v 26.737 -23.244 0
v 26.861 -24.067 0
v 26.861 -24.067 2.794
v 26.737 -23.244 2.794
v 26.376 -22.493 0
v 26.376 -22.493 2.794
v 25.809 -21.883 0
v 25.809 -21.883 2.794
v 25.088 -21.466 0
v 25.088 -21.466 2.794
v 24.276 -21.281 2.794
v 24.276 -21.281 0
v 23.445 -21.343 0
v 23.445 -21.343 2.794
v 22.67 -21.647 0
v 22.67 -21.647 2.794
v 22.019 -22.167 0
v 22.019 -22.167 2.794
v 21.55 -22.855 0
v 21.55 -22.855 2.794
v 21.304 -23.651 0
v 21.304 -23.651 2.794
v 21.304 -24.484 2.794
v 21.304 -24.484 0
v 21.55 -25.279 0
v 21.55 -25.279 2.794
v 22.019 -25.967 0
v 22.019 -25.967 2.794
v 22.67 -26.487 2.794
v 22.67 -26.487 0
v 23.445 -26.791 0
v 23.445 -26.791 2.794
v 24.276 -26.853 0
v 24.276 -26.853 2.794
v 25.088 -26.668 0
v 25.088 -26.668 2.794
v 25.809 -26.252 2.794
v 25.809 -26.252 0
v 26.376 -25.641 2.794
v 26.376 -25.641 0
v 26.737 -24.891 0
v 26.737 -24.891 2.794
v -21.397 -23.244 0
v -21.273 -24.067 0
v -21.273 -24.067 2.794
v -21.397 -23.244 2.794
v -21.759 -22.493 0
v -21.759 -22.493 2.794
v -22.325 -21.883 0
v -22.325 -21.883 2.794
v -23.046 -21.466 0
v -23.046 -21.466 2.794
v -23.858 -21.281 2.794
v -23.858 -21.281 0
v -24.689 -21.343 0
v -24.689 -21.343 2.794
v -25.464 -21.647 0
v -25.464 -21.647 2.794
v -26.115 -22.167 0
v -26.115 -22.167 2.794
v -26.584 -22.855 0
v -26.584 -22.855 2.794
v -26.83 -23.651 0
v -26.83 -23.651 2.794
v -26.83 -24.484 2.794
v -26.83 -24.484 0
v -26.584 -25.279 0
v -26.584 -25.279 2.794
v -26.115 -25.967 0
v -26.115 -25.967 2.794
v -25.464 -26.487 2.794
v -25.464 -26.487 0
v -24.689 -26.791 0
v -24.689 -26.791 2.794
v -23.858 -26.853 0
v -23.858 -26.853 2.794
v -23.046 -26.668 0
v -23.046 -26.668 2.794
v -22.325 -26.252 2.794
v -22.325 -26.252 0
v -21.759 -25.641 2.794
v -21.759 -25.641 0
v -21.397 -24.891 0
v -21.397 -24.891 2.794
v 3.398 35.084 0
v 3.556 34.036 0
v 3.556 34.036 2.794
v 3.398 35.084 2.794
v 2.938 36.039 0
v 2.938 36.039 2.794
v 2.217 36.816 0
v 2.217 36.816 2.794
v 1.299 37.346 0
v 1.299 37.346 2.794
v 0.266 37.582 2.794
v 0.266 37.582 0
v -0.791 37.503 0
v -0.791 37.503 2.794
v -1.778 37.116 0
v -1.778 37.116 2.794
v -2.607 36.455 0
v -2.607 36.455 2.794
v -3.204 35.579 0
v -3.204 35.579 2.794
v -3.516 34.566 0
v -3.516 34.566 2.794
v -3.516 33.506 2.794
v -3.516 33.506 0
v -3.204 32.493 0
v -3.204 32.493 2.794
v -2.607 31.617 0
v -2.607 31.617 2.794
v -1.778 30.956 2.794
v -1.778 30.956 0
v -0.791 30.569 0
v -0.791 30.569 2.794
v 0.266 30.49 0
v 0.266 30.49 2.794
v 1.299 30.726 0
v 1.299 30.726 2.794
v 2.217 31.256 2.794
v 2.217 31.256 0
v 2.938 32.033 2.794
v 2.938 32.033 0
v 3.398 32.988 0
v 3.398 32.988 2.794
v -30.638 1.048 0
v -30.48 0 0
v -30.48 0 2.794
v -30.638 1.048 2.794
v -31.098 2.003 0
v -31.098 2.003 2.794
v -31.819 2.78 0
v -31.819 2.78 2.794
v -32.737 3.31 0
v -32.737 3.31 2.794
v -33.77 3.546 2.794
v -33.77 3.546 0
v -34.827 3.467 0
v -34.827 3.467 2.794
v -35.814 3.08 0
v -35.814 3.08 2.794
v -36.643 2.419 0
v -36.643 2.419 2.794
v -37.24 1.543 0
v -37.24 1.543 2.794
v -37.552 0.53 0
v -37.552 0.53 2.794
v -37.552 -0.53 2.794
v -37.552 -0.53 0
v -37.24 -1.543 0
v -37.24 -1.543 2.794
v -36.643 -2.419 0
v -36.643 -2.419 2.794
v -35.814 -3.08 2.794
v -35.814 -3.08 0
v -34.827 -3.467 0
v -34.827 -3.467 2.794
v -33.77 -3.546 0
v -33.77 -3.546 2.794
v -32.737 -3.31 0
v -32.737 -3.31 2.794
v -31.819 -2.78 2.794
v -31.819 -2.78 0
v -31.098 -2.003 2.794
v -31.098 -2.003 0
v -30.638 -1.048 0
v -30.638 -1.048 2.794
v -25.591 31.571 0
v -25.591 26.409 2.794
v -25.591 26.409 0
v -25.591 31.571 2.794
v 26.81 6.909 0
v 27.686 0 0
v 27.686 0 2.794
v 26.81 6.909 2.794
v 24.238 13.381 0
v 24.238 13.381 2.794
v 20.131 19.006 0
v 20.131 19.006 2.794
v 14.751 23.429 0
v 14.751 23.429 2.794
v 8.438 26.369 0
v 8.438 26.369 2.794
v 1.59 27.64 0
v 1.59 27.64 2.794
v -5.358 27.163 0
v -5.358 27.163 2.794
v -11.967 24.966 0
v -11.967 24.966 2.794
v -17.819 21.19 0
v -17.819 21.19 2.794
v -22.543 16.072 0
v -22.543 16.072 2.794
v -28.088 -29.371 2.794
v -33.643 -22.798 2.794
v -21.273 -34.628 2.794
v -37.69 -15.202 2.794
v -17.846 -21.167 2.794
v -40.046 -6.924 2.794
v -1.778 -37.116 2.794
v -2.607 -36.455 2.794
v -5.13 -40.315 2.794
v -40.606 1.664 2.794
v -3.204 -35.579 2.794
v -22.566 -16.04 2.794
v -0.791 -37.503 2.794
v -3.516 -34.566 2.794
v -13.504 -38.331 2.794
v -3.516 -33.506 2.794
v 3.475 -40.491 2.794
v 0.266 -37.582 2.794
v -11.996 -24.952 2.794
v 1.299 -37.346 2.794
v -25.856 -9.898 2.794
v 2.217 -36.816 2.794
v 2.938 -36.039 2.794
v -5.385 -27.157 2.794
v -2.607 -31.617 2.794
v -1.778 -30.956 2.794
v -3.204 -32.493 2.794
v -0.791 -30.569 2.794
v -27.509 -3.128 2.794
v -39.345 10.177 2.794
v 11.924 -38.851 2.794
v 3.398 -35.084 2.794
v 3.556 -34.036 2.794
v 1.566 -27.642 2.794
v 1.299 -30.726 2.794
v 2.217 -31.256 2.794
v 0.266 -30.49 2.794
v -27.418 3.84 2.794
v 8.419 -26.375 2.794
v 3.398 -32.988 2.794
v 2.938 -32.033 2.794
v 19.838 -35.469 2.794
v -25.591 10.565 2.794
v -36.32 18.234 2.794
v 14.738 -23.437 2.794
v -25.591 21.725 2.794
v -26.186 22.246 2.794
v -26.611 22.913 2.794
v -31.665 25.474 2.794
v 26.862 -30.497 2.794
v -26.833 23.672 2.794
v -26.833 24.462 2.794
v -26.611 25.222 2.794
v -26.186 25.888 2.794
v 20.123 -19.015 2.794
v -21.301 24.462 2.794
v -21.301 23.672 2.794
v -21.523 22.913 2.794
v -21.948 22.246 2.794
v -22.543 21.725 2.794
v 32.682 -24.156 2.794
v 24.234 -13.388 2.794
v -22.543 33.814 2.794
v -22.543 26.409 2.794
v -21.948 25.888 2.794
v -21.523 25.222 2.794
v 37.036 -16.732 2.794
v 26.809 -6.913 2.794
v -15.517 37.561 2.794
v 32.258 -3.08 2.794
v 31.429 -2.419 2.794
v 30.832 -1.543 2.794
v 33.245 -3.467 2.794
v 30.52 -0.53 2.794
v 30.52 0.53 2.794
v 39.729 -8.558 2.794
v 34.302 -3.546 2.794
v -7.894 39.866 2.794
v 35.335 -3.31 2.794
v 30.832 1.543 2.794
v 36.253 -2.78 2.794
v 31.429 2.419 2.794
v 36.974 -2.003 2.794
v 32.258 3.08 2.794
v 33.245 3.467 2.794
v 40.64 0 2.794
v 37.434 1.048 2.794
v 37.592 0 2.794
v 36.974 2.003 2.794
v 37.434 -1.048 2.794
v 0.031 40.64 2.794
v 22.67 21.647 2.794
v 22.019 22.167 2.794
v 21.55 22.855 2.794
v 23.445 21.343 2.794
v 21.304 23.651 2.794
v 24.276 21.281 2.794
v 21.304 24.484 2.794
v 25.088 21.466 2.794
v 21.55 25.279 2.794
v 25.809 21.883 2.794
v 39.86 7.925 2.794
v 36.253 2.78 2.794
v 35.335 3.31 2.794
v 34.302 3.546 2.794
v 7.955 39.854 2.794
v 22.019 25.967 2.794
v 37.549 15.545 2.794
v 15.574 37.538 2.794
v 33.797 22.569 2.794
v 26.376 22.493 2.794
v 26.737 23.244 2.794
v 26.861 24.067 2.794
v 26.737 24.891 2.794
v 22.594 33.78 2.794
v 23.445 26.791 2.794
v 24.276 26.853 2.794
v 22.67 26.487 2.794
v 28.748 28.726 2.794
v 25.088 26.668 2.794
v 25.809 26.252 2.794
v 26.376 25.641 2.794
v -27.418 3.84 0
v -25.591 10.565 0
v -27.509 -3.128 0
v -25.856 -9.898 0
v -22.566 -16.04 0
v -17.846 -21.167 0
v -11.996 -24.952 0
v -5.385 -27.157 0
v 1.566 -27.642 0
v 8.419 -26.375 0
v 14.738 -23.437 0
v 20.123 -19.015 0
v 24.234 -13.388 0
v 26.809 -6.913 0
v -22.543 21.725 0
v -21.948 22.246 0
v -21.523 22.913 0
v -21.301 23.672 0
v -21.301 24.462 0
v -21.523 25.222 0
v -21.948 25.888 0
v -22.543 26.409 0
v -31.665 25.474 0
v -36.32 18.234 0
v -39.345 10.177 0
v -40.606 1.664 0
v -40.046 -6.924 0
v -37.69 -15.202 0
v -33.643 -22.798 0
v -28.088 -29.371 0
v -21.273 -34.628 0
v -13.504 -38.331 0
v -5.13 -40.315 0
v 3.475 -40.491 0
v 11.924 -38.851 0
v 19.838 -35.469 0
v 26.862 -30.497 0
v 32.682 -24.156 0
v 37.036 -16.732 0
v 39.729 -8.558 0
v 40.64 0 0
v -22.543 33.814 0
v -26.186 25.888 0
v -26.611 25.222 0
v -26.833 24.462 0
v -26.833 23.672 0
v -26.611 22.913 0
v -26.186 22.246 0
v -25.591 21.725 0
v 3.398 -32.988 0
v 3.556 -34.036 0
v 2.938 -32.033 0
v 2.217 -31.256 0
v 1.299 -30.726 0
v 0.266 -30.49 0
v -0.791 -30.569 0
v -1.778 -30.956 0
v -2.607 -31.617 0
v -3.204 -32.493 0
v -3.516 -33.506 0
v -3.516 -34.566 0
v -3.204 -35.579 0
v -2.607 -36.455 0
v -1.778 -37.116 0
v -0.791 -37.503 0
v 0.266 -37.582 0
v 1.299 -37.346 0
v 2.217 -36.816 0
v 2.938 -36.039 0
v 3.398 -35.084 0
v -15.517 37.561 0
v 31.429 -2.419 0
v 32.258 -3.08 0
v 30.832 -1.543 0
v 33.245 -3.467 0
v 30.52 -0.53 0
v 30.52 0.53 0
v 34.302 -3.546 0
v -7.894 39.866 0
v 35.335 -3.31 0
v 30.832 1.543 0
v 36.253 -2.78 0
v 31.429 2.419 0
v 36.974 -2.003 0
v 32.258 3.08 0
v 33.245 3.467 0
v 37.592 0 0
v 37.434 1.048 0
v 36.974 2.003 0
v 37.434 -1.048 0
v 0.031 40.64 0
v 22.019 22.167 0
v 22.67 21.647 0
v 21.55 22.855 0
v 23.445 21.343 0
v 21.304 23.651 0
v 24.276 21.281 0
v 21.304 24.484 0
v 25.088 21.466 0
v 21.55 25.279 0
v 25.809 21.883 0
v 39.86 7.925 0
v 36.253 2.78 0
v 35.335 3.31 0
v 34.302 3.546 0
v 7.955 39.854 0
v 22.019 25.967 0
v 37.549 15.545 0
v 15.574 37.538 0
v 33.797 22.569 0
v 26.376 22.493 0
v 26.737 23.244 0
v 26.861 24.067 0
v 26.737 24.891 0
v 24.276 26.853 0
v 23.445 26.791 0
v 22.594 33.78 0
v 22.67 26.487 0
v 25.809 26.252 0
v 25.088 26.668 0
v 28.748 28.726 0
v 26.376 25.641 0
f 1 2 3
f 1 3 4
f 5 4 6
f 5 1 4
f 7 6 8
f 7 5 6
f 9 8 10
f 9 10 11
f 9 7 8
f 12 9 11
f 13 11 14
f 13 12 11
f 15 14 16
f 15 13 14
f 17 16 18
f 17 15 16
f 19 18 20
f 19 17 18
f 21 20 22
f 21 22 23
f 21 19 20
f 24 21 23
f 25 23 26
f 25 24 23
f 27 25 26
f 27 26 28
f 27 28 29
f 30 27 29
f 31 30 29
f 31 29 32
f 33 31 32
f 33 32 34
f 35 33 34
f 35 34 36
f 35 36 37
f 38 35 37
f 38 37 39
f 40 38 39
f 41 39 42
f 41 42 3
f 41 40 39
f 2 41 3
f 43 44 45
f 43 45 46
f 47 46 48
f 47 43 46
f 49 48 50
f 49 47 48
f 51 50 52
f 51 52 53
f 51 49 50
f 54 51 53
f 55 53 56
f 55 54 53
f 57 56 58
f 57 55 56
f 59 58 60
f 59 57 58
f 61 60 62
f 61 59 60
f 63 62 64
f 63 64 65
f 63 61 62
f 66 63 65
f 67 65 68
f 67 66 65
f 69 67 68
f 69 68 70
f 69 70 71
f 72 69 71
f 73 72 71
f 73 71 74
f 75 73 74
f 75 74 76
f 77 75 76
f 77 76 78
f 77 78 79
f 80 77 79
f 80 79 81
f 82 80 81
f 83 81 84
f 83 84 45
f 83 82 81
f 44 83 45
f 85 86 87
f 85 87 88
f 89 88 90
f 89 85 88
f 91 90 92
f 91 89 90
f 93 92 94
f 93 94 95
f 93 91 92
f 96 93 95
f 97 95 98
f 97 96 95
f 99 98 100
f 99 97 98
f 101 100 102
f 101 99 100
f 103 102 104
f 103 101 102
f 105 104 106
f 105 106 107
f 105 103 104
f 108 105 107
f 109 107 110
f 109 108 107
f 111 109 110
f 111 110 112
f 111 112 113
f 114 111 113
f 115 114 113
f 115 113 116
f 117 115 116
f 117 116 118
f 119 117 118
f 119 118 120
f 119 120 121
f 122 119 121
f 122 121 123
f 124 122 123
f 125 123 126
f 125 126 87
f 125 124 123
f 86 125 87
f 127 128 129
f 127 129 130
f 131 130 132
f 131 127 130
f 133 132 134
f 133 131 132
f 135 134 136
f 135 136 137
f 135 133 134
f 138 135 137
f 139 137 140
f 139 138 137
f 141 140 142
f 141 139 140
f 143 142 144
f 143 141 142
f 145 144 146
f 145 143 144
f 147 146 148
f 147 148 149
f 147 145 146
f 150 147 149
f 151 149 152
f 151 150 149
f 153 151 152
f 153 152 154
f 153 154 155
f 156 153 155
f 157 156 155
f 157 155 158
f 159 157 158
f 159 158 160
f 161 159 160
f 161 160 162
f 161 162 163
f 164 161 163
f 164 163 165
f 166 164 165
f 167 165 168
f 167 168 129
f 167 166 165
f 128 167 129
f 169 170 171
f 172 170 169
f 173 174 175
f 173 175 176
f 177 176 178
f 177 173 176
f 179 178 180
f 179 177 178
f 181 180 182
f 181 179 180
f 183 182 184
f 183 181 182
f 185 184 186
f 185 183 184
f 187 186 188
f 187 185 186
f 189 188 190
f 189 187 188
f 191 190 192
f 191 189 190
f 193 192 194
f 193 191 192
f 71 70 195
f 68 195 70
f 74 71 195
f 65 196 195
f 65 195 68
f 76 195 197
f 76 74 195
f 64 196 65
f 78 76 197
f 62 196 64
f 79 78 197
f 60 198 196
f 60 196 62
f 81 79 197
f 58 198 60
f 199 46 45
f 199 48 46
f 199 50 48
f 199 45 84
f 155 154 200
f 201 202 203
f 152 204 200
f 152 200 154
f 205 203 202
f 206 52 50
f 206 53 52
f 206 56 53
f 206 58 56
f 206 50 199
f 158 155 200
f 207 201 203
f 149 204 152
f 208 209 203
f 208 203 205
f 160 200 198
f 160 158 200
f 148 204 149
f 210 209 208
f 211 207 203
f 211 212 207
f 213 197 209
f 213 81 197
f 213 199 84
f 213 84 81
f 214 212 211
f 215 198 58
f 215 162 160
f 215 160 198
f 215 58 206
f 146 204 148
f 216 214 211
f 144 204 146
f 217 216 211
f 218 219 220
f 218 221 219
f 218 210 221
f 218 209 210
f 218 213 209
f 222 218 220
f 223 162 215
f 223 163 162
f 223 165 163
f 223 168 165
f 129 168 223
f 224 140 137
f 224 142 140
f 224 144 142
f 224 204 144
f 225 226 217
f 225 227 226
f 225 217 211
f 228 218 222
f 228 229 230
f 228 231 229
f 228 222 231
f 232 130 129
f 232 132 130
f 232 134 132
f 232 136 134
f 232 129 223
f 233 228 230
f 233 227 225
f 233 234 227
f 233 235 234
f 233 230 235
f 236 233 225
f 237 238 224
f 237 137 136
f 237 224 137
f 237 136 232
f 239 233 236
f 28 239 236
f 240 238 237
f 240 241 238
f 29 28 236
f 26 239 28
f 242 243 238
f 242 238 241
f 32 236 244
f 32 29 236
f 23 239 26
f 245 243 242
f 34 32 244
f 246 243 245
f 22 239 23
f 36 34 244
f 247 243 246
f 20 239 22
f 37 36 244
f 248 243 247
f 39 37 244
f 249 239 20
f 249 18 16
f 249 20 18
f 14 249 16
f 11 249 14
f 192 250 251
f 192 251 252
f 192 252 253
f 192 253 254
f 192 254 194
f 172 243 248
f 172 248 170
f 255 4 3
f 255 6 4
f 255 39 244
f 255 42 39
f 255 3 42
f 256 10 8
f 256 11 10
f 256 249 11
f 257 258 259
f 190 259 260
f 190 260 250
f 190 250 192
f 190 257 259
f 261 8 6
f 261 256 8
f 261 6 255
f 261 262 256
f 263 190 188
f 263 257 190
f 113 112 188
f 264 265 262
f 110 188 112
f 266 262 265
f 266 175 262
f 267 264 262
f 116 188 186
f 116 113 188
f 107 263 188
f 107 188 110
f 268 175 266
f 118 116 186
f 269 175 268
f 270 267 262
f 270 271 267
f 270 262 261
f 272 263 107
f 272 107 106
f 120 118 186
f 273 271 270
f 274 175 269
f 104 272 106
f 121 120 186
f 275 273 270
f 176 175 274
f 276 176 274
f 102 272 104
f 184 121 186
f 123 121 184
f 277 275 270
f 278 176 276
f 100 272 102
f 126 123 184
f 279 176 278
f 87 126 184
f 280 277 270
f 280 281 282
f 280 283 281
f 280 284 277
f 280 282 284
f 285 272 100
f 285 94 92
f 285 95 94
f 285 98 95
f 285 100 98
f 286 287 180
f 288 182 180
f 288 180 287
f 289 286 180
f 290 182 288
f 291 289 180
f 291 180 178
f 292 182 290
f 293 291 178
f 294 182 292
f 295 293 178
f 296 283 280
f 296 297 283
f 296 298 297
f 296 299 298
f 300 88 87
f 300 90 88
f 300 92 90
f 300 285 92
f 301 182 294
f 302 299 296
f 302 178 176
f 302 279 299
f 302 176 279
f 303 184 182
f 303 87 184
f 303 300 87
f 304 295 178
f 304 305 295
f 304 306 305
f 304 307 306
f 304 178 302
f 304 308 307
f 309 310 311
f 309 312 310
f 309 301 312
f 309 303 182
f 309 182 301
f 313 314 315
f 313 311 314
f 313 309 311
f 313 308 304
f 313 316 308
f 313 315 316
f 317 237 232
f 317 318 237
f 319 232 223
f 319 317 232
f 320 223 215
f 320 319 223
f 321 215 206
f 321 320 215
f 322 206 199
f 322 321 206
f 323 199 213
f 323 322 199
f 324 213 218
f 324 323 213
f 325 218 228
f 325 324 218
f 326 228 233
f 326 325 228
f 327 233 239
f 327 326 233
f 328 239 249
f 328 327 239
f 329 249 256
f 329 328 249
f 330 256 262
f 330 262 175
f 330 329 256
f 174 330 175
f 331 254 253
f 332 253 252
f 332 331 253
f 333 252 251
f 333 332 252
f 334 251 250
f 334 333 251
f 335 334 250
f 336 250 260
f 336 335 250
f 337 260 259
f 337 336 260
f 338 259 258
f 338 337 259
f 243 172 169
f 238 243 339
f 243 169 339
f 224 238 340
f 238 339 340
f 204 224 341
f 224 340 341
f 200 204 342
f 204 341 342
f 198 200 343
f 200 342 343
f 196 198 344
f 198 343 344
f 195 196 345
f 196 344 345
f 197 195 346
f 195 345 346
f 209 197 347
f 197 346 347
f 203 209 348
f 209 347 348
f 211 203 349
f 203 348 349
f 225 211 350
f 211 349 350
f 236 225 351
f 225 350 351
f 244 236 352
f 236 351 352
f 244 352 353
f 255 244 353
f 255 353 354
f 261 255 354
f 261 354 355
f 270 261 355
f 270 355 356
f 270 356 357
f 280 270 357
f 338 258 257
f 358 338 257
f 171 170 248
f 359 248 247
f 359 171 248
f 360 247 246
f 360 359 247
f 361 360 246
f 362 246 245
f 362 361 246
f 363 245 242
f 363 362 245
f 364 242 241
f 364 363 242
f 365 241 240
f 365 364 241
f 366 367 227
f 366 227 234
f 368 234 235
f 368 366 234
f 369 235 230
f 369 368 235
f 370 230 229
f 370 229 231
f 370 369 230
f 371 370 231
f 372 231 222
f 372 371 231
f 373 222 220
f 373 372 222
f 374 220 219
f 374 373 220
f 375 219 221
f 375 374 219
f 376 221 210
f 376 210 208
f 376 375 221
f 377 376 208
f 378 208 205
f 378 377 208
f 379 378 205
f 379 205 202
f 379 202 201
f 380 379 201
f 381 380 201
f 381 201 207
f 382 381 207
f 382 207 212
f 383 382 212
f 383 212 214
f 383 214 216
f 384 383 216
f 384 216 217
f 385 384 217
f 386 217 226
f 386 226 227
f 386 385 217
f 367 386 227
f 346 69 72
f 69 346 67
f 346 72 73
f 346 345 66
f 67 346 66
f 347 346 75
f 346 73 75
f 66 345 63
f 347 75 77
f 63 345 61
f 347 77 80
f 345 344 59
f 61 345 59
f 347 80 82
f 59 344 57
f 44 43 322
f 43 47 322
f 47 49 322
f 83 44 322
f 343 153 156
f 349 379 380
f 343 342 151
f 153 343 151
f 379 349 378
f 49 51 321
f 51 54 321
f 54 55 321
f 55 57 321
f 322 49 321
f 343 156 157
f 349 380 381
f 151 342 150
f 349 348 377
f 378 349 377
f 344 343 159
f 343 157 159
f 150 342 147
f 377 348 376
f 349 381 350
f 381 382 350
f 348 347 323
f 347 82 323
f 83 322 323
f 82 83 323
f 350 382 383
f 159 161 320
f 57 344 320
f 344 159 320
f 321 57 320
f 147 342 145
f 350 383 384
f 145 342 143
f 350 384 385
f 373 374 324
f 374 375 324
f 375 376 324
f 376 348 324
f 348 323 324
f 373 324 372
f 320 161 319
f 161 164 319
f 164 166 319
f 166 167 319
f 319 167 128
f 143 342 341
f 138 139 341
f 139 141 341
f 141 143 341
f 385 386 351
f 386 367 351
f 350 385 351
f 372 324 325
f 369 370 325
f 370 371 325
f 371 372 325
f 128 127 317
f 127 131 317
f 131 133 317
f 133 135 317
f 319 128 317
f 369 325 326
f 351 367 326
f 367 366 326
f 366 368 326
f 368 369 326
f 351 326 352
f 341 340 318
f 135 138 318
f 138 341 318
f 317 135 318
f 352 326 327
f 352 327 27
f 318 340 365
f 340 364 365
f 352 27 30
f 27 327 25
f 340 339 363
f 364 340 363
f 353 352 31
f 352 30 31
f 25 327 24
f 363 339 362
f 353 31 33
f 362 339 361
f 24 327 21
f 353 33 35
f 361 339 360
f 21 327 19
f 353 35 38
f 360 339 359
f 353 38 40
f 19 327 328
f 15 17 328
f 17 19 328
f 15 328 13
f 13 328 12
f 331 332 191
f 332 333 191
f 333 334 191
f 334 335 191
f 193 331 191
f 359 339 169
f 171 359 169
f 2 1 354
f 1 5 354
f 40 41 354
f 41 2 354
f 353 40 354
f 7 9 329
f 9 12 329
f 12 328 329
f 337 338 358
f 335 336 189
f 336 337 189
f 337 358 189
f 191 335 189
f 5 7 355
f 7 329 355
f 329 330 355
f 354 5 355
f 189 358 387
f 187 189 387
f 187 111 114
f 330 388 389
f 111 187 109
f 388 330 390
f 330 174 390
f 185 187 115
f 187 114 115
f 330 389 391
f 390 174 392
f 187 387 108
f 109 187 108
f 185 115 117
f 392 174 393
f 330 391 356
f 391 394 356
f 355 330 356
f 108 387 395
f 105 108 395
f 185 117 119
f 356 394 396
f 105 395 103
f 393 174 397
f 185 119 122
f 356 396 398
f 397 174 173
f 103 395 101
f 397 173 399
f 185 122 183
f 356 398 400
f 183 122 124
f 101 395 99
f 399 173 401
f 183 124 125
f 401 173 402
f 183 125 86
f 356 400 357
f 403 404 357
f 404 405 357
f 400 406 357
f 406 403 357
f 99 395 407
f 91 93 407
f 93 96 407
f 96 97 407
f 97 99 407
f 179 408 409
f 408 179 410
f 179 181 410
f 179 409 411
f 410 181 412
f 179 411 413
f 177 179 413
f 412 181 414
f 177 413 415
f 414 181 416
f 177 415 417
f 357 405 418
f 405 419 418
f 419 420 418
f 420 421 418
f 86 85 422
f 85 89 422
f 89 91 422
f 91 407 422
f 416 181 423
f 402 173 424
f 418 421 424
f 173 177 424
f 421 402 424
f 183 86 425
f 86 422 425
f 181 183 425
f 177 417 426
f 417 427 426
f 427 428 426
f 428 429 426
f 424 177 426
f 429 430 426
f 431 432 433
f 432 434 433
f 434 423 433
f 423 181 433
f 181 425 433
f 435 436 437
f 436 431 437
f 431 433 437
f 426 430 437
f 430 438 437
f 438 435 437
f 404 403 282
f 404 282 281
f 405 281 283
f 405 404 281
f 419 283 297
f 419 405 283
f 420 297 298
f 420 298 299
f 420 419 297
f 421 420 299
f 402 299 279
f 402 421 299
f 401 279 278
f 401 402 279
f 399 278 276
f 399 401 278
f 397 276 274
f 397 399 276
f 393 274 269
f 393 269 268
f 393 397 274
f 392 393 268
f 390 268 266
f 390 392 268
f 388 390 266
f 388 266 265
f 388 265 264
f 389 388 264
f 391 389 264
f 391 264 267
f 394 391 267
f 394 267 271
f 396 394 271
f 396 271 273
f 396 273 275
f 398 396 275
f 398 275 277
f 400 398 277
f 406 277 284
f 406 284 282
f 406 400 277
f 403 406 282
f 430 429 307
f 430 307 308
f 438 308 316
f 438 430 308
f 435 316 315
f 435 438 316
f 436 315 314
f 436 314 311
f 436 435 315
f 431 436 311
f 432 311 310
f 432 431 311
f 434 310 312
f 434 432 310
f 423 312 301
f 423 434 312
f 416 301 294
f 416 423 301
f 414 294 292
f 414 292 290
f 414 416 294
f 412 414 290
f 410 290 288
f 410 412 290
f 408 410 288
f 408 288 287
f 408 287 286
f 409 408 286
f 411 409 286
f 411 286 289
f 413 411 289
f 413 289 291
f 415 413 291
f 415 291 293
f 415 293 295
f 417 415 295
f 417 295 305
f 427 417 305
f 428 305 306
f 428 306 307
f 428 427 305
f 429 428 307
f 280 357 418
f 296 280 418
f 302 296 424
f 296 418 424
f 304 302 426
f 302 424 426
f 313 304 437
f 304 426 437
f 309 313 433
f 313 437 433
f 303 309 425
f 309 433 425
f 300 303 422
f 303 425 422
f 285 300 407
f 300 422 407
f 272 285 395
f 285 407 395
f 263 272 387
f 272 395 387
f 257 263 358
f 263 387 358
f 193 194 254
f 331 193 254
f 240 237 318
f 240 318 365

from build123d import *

# Parameters (mm, degrees)
SKETCH1_R           = 40.64
SKETCH1_R_2         = 27.686
SKETCH1_R_3         = 3.556
SKETCH1_R_4         = 2.794
BOSS_EXTRUDE1_DEPTH = 2.794
SKETCH2_W           = 3.048
SKETCH2_H           = 48.134172809
CUT_EXTRUDE1_DEPTH  = 14.097


with BuildPart() as part:
    # Sketch1 → Boss-Extrude1 (new body)
    with BuildSketch(Plane.XY):
        Circle(SKETCH1_R)
        Circle(SKETCH1_R_2, mode=Mode.SUBTRACT)
        with Locations((0, 34.036)):
            Circle(SKETCH1_R_3, mode=Mode.SUBTRACT)
        with Locations((34.036, 0)):
            Circle(SKETCH1_R_3, mode=Mode.SUBTRACT)
        with Locations((0, -34.036)):
            Circle(SKETCH1_R_3, mode=Mode.SUBTRACT)
        with Locations((-34.036, 0)):
            Circle(SKETCH1_R_3, mode=Mode.SUBTRACT)
        with Locations((24.067086404, 24.067086404)):
            Circle(SKETCH1_R_4, mode=Mode.SUBTRACT)
        with Locations((24.067086404, -24.067086404)):
            Circle(SKETCH1_R_4, mode=Mode.SUBTRACT)
        with Locations((-24.067086404, -24.067086404)):
            Circle(SKETCH1_R_4, mode=Mode.SUBTRACT)
        with Locations((-24.067086404, 24.067086404)):
            Circle(SKETCH1_R_4, mode=Mode.SUBTRACT)
    extrude(amount=BOSS_EXTRUDE1_DEPTH)

    # Sketch2 → Cut-Extrude1 (cut)
    with BuildSketch(Plane.XY.offset(2.794)):
        with Locations((-24.067086404, 24.067086405)):
            Rectangle(SKETCH2_W, SKETCH2_H)
    extrude(amount=-CUT_EXTRUDE1_DEPTH, mode=Mode.SUBTRACT)


solid = part.part
